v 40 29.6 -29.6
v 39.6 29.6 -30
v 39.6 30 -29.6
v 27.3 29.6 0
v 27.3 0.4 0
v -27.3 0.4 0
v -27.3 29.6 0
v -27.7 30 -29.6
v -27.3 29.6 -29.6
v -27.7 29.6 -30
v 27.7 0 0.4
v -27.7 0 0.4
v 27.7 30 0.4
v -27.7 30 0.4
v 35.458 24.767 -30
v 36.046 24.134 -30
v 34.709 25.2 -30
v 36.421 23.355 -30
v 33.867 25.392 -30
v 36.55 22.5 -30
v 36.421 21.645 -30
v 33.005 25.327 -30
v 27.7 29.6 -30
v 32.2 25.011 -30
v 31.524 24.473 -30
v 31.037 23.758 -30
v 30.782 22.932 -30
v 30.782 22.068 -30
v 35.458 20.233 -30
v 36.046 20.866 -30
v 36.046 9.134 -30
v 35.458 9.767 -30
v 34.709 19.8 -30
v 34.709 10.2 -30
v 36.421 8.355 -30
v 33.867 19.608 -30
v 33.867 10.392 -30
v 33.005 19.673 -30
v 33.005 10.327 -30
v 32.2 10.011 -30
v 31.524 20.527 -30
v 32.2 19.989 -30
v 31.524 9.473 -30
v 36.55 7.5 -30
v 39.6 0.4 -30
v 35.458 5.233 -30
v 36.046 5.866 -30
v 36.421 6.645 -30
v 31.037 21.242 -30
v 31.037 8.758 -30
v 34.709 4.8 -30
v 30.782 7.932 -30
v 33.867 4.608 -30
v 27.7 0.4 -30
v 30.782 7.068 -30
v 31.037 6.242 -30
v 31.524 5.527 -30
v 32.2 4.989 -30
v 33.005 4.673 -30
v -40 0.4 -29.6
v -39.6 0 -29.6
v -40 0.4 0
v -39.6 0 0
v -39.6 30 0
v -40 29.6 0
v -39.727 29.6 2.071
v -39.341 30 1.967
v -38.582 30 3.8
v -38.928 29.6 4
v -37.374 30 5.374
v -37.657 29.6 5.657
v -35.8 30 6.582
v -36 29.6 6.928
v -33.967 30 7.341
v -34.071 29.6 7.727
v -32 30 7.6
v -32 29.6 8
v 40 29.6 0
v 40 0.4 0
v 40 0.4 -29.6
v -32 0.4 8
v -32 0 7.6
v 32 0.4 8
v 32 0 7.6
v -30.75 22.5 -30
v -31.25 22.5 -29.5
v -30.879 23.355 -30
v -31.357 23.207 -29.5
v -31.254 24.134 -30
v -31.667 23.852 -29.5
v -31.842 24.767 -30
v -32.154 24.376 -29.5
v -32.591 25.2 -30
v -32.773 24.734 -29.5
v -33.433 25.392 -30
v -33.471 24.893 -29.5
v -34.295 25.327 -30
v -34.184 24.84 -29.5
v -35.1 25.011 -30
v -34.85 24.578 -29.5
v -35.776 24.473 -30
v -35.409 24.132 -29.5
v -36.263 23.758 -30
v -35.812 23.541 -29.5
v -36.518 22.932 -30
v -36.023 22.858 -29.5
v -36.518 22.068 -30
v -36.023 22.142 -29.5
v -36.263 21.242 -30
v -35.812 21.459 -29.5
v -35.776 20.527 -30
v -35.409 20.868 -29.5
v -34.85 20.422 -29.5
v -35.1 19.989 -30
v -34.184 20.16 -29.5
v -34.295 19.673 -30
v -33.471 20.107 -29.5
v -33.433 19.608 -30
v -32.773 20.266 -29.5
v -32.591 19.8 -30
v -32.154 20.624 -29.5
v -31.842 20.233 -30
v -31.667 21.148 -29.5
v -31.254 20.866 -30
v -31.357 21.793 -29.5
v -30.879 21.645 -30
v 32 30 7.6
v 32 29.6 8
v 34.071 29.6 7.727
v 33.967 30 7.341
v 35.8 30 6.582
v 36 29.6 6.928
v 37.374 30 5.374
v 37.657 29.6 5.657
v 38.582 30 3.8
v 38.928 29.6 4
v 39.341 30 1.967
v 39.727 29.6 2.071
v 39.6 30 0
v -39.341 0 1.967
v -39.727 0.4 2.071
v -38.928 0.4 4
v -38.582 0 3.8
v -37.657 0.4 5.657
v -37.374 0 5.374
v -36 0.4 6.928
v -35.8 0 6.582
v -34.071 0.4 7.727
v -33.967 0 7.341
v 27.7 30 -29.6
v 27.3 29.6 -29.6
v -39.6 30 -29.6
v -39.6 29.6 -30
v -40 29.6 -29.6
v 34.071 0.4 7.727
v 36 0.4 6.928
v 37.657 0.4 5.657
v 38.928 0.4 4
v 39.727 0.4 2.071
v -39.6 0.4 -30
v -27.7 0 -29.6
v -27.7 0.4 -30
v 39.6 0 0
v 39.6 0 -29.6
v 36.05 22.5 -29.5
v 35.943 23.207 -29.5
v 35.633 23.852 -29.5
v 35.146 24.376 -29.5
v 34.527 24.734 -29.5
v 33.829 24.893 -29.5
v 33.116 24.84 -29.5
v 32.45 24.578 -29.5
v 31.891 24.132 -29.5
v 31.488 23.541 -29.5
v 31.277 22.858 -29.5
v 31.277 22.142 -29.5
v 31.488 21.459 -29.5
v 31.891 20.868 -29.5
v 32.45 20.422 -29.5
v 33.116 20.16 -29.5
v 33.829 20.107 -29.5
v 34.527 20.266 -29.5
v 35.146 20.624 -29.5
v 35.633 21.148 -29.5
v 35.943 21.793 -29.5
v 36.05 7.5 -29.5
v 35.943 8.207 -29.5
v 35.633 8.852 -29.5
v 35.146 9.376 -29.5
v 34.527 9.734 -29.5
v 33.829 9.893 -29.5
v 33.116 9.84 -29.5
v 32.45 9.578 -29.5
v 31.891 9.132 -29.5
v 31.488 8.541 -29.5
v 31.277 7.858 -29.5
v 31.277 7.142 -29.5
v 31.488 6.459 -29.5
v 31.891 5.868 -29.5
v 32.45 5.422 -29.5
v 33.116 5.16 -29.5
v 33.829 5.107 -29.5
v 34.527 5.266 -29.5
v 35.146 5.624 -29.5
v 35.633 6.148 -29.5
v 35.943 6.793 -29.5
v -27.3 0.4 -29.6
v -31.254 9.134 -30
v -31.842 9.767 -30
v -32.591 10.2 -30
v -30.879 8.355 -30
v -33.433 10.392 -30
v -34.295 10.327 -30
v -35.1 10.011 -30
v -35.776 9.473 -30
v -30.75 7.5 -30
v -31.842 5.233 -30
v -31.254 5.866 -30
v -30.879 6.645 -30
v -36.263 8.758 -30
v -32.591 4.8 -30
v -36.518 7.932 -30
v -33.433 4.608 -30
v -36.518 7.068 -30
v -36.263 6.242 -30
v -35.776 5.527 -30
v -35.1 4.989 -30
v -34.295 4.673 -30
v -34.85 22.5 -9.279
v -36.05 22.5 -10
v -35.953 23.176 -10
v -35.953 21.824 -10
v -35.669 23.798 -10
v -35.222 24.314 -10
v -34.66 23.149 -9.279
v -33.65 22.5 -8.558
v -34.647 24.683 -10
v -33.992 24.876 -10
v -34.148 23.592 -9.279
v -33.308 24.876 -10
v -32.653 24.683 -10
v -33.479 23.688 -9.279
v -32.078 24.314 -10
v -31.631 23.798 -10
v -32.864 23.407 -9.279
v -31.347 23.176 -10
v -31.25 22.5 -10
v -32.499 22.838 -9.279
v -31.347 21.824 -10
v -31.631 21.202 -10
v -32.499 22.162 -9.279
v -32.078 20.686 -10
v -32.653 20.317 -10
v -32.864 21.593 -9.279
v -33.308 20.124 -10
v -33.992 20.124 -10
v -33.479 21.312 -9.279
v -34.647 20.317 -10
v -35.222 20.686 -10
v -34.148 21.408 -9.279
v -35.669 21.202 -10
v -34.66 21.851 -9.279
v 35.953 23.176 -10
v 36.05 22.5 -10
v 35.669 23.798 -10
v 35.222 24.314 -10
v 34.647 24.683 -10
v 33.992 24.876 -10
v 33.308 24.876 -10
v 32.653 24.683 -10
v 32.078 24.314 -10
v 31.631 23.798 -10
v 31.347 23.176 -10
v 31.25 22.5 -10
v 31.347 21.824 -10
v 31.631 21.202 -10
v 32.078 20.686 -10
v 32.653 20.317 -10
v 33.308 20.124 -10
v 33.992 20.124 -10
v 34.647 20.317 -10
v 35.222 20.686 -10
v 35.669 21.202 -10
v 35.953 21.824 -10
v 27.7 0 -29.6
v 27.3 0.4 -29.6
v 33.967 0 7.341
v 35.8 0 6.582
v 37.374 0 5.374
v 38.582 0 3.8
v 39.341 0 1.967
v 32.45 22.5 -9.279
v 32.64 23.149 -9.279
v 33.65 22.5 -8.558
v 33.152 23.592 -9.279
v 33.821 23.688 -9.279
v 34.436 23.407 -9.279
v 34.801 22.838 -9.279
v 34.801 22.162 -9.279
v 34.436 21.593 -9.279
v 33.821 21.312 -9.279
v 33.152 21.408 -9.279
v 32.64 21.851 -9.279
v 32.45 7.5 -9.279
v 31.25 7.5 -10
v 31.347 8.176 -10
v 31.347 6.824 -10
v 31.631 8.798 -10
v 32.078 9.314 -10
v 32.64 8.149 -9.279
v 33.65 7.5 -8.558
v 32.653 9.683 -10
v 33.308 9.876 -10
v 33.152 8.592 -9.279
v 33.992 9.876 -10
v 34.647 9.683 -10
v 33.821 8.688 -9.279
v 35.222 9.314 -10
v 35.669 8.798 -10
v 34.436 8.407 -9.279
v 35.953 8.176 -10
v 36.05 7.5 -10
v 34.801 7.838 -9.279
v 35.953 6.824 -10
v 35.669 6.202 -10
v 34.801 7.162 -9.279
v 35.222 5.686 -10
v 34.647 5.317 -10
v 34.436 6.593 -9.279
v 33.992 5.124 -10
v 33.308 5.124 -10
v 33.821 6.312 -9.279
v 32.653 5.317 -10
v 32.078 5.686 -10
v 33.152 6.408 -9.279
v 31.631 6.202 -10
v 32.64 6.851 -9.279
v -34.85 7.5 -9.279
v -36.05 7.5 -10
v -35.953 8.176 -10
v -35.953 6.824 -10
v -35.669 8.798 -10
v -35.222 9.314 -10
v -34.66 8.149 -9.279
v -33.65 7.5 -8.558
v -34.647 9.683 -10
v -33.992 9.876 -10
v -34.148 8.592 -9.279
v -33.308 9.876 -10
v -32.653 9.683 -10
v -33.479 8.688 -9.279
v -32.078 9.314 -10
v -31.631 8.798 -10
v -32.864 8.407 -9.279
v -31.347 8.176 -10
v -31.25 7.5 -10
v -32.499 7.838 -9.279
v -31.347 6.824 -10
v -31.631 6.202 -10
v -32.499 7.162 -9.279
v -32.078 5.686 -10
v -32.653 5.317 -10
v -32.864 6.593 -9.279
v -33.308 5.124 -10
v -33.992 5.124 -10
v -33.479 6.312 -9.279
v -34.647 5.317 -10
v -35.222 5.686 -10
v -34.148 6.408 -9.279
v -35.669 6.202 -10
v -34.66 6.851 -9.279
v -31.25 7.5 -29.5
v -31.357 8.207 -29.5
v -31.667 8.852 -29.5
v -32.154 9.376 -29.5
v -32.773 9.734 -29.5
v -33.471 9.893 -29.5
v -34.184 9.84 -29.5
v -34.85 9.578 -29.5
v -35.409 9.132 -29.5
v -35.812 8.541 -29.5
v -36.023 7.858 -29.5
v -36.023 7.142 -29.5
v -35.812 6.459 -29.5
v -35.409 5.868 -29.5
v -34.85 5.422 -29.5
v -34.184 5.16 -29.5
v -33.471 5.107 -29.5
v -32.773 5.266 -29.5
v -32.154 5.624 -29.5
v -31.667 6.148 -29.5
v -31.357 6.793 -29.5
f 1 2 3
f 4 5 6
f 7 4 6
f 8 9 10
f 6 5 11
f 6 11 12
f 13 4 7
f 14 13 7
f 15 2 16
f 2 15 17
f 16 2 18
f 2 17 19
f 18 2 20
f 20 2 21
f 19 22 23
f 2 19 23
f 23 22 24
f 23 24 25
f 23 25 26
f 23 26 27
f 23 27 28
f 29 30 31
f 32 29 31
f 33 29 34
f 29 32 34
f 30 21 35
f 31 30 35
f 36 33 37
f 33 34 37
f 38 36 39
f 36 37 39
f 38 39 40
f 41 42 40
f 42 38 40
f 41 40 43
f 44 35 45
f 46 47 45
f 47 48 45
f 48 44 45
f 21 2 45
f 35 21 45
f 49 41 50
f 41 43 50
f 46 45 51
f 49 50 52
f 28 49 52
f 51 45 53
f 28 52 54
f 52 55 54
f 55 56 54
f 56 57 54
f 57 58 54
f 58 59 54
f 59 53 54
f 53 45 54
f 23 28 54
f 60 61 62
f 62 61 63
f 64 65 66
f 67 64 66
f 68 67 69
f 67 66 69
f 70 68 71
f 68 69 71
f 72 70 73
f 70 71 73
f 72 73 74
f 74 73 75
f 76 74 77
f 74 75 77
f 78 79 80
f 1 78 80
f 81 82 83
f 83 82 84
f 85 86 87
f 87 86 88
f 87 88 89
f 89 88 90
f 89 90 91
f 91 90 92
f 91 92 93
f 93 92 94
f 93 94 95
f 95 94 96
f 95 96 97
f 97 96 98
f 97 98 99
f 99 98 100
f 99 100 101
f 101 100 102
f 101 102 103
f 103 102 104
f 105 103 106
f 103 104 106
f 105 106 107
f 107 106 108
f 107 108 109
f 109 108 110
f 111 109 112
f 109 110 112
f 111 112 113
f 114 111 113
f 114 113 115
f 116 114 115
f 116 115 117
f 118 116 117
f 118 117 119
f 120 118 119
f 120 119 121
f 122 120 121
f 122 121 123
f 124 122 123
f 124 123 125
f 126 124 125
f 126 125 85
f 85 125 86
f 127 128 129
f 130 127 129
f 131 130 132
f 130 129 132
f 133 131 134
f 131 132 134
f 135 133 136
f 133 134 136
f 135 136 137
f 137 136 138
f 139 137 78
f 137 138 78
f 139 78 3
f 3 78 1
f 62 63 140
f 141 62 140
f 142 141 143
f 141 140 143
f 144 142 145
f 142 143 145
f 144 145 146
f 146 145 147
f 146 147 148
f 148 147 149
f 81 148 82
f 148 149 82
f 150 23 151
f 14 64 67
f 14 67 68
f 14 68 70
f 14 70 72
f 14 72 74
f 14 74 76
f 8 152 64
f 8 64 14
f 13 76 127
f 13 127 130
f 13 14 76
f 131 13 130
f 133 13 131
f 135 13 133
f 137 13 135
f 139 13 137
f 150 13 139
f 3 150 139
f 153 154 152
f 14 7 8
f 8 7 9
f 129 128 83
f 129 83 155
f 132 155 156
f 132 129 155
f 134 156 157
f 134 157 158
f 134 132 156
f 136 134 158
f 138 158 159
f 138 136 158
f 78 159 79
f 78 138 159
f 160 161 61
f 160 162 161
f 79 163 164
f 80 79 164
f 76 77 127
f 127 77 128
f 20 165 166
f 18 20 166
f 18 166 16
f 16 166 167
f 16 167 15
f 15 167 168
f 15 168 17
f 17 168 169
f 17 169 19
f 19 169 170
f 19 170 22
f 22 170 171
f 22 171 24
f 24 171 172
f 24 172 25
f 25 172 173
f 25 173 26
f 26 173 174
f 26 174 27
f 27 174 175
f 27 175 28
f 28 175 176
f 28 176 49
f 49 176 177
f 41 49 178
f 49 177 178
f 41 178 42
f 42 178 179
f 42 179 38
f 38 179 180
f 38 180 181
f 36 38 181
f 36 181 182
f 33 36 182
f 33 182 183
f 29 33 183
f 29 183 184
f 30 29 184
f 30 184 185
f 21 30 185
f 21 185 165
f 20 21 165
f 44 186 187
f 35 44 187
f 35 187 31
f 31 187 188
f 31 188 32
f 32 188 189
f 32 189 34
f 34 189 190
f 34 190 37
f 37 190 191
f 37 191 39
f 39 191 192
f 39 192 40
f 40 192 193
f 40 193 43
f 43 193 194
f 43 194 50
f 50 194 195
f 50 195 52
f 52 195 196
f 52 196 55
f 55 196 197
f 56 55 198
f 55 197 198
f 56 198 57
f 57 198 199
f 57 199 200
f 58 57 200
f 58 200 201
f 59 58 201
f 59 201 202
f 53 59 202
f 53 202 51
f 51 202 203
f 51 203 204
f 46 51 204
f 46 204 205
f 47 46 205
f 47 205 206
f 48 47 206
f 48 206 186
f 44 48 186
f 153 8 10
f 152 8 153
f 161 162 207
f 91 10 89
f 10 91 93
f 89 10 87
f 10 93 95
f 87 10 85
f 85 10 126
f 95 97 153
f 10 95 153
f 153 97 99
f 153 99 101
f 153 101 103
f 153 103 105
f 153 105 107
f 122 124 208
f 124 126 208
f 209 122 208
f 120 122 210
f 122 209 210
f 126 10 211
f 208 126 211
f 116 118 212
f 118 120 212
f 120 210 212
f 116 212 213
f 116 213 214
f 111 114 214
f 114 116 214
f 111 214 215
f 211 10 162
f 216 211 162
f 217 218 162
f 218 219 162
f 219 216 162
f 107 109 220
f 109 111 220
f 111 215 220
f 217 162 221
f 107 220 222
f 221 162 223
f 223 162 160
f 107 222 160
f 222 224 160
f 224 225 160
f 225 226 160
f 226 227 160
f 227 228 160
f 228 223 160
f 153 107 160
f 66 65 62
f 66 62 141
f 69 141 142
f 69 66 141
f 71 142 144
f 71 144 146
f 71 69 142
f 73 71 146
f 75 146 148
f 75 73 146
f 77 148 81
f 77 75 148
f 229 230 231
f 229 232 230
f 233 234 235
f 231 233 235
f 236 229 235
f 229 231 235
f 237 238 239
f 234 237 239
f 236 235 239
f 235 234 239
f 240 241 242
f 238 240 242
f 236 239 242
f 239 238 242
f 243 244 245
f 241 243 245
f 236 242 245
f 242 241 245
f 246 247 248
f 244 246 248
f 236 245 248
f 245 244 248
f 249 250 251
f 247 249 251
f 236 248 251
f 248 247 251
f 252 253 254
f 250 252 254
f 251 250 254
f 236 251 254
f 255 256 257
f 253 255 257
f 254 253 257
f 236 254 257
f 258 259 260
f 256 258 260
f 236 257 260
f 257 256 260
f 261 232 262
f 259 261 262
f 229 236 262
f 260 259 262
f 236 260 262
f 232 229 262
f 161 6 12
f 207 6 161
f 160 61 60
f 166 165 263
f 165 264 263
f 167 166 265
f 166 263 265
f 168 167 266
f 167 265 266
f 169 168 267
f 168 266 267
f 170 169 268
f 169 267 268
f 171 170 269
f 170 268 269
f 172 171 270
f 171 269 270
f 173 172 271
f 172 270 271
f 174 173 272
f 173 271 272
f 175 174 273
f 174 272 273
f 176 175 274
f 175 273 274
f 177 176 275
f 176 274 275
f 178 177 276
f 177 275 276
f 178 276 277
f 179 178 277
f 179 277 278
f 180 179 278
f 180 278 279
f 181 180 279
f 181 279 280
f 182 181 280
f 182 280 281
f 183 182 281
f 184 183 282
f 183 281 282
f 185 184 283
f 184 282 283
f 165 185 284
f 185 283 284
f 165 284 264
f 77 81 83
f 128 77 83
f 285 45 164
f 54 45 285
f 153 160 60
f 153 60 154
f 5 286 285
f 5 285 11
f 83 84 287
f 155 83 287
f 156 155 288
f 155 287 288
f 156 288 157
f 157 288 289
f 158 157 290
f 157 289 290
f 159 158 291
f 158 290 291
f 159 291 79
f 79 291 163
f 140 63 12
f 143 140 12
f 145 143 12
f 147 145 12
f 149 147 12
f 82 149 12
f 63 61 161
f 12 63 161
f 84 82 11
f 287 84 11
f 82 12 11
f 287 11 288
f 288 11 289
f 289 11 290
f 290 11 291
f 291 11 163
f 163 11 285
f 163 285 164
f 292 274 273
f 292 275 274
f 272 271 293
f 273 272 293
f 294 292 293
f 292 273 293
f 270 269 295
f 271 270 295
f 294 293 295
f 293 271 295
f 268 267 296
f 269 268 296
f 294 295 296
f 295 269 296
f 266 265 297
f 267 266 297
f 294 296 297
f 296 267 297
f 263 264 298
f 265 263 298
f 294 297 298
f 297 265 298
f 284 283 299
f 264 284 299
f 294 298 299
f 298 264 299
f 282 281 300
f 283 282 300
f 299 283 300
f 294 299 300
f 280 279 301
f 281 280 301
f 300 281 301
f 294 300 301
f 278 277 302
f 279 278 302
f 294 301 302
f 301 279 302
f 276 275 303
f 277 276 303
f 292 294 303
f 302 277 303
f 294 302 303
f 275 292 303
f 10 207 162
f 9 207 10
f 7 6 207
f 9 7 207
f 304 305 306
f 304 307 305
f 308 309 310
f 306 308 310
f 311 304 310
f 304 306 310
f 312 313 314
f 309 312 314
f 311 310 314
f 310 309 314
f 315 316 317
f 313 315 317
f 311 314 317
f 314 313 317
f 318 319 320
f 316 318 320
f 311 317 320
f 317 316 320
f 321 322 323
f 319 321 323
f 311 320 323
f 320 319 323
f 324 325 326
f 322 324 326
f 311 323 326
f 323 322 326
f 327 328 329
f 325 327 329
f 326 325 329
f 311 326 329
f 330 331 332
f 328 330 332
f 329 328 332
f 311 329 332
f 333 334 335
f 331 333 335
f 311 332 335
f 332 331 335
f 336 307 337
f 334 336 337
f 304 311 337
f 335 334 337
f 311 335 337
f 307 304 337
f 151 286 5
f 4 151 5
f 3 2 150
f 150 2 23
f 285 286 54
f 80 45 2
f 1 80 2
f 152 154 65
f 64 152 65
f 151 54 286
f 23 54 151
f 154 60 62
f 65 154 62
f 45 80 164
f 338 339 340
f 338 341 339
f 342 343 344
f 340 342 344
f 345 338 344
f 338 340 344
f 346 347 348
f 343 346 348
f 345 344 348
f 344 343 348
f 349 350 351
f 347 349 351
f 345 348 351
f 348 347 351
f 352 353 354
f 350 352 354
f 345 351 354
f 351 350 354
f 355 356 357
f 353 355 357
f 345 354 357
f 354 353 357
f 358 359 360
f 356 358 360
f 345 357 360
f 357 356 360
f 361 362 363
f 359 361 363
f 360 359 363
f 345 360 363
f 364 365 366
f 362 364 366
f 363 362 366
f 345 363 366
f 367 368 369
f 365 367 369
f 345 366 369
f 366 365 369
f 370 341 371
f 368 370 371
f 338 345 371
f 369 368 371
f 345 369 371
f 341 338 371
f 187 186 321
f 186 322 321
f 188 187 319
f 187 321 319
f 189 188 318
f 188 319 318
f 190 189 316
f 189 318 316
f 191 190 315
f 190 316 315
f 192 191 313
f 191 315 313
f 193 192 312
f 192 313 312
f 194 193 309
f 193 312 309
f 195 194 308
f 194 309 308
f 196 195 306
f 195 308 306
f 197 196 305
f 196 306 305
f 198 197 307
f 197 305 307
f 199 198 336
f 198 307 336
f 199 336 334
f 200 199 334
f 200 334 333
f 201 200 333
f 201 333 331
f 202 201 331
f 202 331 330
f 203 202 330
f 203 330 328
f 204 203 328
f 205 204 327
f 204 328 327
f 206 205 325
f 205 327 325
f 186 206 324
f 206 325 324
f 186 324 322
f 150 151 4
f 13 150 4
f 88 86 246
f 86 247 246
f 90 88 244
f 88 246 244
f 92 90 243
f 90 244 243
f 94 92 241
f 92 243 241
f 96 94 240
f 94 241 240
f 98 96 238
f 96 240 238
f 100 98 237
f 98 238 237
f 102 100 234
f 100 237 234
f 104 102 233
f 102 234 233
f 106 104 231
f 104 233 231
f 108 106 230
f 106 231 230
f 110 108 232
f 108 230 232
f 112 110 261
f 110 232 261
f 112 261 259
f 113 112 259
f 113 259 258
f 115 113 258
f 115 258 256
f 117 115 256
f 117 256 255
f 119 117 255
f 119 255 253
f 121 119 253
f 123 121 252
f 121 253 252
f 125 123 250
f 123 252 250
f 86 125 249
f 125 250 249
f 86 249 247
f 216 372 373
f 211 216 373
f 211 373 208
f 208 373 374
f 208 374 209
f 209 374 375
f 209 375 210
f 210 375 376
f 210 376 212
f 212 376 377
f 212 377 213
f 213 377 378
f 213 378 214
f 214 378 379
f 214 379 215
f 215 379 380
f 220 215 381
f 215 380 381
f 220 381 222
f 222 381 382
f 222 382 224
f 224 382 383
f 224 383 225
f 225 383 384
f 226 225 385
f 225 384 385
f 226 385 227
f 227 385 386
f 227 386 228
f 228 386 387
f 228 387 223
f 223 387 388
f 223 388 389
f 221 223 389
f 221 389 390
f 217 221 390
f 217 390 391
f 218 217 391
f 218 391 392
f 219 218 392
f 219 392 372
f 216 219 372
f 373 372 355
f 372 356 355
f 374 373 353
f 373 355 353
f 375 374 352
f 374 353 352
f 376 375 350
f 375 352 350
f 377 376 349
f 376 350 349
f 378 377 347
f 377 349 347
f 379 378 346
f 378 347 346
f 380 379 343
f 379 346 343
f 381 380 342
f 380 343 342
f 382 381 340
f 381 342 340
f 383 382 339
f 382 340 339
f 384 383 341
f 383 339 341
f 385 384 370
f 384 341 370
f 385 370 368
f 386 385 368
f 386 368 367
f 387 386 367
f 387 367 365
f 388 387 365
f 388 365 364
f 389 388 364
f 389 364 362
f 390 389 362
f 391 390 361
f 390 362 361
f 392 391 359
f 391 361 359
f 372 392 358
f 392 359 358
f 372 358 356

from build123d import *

# Parameters (mm, degrees)
BOSS_EXTRUDE1_DEPTH             = 30
F_2_5MM_DOWEL_HOLE1_D           = 4.8
F_2_5MM_DOWEL_HOLE1_DEPTH       = 20
F_2_5MM_DOWEL_HOLE1_CSINK_D     = 5.8
F_2_5MM_DOWEL_HOLE1_CSINK_ANGLE = 90
F_2_5MM_DOWEL_HOLE1_TIP         = 1.442065486
FILLET1_R                       = 8
CHAMFER1_SIZE                   = 0.4


with BuildPart() as part:
    # Sketch1 → Boss-Extrude1 (new body)
    with BuildSketch(Plane(origin=(0, 0, 0), x_dir=(1, 0, 0), z_dir=(0, 1, 0))):
        Polygon((-40, 30), (-40, -8), (40, -8), (40, 30), (27.3, 30), (27.3, 0), (-27.3, 0), (-27.3, 30), align=None)
    extrude(amount=BOSS_EXTRUDE1_DEPTH)

    # Ø2.5mm Dowel Hole1
    with Locations(Plane(origin=(0, 0, -30), x_dir=(-1, 0, 0), z_dir=(0, 0, -1))):
        with Locations((33.65, 7.5), (-33.65, 22.5), (-33.65, 7.5), (33.65, 22.5)):
            CounterSinkHole(F_2_5MM_DOWEL_HOLE1_D / 2, F_2_5MM_DOWEL_HOLE1_CSINK_D / 2, depth=F_2_5MM_DOWEL_HOLE1_DEPTH, counter_sink_angle=F_2_5MM_DOWEL_HOLE1_CSINK_ANGLE)
            with Locations((0, 0, -(F_2_5MM_DOWEL_HOLE1_DEPTH + F_2_5MM_DOWEL_HOLE1_TIP / 2))):  # 118° drill point
                Cone(0, F_2_5MM_DOWEL_HOLE1_D / 2, F_2_5MM_DOWEL_HOLE1_TIP, mode=Mode.SUBTRACT)

    # Fillet1
    fillet1_edges = [part.edges().sort_by_distance(p)[0] for p in [
        (40, 15, 8),
        (-40, 15, 8),
    ]]
    fillet(fillet1_edges, radius=FILLET1_R)

    # Chamfer1
    chamfer1_edges = [part.edges().sort_by_distance(p)[0] for p in [
        (-40, 0, -15),
        (-33.65, 0, -30),
        (-27.3, 15, -30),
        (27.3, 15, -30),
        (40, 15, -30),
        (-40, 15, -30),
        (33.65, 30, -30),
        (27.3, 30, -15),
        (0, 30, 0),
        (-27.3, 30, -15),
        (0, 0, 8),
        (0, 30, 8),
        (40, 0, -15),
        (37.656854249, 0, 5.656854249),
        (-37.656854249, 0, 5.656854249),
        (40, 30, -15),
        (37.656854249, 30, 5.656854249),
        (-33.65, 30, -30),
        (-37.656854249, 30, 5.656854249),
        (-27.3, 0, -15),
        (-40, 30, -15),
        (0, 0, 0),
        (27.3, 0, -15),
        (33.65, 0, -30),
    ]]
    chamfer(chamfer1_edges, length=CHAMFER1_SIZE)


solid = part.part
